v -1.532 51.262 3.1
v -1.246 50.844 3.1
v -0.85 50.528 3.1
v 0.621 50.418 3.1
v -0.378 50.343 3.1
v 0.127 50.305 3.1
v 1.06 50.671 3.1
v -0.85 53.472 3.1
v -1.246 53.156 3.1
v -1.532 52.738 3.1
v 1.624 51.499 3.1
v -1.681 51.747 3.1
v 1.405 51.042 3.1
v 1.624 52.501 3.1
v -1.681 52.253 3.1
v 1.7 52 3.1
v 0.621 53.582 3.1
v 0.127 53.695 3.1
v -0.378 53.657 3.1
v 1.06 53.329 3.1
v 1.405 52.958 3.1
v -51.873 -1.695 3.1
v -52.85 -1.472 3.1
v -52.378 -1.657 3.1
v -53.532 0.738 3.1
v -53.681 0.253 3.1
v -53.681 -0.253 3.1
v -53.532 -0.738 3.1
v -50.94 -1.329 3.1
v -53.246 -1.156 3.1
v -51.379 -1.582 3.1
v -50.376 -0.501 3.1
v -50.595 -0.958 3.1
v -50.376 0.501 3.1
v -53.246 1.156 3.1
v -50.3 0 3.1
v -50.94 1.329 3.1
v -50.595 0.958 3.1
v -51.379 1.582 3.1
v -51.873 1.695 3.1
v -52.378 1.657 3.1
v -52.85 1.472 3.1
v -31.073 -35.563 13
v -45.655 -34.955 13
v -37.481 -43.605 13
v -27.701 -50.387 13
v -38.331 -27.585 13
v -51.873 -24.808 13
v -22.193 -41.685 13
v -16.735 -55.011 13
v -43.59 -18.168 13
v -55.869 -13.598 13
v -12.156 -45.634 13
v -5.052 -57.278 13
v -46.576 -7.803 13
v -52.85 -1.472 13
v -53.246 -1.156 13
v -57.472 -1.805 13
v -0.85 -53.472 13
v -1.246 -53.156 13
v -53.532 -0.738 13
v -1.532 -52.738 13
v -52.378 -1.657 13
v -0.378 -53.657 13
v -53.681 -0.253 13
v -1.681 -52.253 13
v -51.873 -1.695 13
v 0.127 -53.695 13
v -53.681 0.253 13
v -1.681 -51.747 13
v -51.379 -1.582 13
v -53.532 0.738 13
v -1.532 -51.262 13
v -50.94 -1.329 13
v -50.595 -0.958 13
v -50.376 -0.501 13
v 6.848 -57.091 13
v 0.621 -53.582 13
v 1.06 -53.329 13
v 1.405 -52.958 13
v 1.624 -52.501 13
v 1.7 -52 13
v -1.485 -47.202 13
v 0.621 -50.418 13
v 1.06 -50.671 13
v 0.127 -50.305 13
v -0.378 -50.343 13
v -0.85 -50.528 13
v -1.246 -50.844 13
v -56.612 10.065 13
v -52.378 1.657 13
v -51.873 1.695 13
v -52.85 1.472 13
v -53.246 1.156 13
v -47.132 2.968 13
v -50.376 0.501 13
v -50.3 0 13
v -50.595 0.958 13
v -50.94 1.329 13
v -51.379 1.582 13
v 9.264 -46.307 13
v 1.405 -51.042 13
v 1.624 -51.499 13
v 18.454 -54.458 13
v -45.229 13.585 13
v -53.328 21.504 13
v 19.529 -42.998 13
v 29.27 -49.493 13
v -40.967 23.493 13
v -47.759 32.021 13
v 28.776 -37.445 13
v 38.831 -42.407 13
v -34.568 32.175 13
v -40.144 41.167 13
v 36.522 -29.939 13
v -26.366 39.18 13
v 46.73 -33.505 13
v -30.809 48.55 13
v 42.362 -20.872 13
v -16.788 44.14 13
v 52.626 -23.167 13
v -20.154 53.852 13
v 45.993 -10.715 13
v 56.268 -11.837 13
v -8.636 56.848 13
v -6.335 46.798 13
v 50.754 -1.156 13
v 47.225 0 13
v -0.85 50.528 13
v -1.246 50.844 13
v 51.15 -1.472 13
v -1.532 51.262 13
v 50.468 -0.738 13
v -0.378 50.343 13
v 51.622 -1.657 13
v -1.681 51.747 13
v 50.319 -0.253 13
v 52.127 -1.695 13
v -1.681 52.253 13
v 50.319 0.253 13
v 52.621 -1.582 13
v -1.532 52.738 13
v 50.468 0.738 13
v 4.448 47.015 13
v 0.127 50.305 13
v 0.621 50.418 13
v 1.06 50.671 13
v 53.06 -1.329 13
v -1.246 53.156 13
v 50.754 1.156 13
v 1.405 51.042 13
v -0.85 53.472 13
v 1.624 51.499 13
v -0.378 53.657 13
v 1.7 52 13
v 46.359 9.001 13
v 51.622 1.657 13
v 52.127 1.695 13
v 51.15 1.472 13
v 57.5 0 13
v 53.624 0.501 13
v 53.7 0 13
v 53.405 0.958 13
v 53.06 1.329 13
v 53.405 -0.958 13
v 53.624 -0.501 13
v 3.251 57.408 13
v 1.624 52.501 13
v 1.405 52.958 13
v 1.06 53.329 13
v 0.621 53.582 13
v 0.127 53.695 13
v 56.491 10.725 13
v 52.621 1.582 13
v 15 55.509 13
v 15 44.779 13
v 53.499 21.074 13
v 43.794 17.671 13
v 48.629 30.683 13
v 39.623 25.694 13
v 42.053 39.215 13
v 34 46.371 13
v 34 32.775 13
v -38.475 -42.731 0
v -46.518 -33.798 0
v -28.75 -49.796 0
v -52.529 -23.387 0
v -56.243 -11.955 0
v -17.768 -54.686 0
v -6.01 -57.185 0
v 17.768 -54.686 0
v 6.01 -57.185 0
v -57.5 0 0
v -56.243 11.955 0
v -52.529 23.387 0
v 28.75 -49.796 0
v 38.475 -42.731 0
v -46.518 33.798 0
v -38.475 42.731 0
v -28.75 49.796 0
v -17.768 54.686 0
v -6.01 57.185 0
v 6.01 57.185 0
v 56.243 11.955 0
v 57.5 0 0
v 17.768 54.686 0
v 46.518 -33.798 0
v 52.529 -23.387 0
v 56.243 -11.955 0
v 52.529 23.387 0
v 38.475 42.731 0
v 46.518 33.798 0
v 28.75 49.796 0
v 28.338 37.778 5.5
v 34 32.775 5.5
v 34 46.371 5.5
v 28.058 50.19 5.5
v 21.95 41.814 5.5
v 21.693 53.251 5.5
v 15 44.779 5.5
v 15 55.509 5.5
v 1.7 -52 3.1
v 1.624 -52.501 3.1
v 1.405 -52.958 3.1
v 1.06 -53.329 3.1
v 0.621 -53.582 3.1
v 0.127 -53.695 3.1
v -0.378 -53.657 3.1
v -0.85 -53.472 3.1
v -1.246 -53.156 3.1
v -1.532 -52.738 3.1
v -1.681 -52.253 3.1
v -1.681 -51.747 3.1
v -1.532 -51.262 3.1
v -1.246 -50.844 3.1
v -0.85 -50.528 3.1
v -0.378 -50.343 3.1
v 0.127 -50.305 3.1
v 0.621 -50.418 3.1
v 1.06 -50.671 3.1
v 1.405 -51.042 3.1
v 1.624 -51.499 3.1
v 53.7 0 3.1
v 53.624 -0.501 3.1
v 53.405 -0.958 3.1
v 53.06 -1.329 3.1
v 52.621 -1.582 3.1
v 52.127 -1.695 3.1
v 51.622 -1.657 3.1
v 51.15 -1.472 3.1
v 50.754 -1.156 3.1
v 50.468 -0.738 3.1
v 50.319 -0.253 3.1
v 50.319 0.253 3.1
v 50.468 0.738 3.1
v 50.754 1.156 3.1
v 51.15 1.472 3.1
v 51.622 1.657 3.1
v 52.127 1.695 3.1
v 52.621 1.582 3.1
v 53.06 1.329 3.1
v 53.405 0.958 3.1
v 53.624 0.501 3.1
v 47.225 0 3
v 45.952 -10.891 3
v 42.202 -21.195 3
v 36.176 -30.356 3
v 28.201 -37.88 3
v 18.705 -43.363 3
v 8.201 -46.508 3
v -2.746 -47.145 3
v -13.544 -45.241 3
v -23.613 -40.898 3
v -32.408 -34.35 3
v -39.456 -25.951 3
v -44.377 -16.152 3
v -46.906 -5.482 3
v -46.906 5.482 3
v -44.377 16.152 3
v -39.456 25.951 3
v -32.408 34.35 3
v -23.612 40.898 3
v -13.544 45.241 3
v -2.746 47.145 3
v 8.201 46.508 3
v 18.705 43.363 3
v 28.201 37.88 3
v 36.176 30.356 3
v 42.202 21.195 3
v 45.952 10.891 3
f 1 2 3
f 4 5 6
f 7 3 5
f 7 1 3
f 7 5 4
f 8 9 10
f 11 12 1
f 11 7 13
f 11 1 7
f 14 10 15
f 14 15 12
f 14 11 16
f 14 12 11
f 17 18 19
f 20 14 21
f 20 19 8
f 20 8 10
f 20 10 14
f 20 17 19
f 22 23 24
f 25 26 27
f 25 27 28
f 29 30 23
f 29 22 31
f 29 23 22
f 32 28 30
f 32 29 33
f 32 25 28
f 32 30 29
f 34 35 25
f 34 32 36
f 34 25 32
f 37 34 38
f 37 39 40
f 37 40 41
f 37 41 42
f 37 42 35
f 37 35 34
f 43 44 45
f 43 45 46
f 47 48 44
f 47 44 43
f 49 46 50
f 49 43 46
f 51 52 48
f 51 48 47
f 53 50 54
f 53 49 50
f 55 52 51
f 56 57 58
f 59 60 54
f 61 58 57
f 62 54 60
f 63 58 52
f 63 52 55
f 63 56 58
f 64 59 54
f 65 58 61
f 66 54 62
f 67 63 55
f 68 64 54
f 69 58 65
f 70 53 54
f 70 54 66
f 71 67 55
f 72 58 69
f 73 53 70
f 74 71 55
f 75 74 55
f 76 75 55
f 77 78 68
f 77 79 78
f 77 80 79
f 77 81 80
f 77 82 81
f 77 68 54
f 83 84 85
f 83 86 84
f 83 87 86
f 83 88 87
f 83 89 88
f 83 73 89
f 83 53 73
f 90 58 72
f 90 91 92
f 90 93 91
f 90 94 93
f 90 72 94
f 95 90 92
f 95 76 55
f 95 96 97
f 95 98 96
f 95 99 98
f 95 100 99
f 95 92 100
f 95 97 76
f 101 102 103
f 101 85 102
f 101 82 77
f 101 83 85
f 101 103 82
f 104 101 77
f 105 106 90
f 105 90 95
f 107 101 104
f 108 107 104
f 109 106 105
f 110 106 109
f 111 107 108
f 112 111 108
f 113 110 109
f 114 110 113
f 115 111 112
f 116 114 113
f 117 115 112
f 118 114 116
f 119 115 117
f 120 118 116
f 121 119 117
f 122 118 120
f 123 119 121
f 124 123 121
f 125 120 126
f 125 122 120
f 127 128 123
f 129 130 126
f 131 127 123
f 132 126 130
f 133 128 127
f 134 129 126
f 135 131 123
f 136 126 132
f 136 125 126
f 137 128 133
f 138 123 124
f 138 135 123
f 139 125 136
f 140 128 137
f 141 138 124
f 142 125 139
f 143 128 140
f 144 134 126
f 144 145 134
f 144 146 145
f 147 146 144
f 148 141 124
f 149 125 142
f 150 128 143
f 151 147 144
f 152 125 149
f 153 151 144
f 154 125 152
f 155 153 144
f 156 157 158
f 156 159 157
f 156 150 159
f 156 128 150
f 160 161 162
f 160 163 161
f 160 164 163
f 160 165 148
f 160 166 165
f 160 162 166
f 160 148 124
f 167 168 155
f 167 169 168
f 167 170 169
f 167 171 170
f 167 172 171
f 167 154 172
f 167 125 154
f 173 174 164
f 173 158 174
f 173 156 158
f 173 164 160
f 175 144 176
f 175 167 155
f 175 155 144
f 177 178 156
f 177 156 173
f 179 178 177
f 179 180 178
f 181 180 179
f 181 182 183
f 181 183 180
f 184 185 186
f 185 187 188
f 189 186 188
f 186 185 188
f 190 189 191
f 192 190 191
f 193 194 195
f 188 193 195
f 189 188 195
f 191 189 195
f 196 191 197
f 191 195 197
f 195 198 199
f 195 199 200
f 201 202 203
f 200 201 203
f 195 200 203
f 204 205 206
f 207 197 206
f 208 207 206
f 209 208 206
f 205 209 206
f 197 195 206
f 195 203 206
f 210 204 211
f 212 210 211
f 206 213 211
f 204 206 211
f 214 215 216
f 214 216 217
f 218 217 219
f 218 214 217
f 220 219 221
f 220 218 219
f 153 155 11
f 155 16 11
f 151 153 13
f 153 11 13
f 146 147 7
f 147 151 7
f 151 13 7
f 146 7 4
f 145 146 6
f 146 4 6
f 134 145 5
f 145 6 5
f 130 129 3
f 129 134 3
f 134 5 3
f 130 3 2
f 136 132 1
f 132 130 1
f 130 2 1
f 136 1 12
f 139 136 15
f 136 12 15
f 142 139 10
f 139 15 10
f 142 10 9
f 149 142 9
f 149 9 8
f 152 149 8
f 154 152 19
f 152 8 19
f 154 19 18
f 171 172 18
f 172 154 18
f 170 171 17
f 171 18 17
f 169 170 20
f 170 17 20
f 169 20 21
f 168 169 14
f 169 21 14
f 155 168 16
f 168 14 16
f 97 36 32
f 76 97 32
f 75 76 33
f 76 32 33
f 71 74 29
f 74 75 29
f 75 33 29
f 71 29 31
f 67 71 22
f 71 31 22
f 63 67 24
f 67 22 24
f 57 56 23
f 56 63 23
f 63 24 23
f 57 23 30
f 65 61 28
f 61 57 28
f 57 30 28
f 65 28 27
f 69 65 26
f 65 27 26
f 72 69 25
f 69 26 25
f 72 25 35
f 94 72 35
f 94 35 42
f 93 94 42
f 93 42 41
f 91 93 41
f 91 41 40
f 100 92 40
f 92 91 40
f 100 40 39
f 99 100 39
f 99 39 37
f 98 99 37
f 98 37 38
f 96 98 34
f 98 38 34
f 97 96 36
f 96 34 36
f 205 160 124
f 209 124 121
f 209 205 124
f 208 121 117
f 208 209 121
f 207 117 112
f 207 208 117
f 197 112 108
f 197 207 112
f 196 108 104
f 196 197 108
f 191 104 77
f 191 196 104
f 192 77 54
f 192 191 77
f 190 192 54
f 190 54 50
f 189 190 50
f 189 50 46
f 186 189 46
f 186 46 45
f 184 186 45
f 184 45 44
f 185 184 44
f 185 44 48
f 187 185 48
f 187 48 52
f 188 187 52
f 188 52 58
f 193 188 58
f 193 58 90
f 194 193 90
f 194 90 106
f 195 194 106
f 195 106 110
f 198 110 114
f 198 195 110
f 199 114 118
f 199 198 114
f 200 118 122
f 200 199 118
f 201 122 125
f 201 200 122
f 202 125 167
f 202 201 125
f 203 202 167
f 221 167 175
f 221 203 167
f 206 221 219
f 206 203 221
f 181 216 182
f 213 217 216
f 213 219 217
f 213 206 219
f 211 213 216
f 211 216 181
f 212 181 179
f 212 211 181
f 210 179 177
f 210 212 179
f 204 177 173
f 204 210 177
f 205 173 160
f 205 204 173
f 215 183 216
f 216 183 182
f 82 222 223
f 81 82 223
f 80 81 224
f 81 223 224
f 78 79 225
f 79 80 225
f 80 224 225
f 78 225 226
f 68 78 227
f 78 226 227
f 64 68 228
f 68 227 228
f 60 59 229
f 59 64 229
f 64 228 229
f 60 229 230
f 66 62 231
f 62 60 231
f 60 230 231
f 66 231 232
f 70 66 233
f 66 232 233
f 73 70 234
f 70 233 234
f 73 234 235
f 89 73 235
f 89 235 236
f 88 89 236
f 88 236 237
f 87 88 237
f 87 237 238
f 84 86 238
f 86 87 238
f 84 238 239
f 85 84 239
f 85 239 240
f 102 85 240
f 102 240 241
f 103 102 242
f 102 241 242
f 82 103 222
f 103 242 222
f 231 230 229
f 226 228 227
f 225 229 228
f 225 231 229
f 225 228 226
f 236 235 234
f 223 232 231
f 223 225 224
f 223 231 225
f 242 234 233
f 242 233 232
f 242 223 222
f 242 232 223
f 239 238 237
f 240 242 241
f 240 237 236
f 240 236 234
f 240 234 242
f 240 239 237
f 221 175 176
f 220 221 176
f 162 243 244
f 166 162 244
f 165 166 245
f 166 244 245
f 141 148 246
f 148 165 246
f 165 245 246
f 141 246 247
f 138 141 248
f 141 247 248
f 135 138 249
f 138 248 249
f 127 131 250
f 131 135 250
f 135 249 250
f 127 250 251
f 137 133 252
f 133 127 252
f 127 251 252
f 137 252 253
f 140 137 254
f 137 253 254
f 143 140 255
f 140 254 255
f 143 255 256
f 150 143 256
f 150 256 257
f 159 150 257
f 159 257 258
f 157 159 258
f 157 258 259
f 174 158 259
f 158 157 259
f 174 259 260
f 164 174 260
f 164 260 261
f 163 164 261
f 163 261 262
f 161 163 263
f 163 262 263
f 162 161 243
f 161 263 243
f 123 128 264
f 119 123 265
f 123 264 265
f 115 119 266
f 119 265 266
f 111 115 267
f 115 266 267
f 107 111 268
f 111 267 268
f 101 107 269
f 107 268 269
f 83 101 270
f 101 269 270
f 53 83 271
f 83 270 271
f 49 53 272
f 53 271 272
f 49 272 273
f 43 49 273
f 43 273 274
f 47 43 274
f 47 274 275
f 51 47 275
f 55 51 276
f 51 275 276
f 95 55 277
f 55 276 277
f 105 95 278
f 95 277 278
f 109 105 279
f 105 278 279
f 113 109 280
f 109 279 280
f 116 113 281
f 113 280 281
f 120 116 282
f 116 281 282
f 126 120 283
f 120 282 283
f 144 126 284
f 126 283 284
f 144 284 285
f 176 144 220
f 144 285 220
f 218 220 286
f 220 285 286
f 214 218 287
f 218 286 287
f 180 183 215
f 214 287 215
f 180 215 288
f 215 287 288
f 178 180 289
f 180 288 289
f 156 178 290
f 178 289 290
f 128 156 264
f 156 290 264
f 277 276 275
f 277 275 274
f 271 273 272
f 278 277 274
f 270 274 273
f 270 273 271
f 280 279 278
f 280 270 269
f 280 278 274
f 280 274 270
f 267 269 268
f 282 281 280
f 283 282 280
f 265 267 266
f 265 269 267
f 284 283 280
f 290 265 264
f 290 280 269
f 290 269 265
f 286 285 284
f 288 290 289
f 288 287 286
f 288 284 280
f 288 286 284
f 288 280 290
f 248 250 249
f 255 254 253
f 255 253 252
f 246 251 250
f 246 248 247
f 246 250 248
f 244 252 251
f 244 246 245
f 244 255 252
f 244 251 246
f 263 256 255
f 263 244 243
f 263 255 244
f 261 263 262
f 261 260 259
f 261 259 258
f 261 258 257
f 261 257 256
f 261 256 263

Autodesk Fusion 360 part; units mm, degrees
sketch "Sketch1" plane through (0, 0, 0) normal (0, 0, 1) x (1, 0, 0)
  circle A0 centre (0, 0) radius 47.225
  circle A1 centre (0, 0) radius 57.5
  circle A2 centre (0, 52) radius 1.7
  circle A3 centre (0, -52) radius 1.7
  circle A4 centre (-52, 0) radius 1.7
  circle A5 centre (52, 0) radius 1.7
  dimension "d1" = 94.45
  dimension "d2" = 115
  dimension "d3" = 3.4
  dimension "d4" = 3.4
  dimension "d5" = 3.4
  dimension "d6" = 3.4
extrude "Extrude4" add sketch "Sketch1" along normal blind 3.1 contours A2 | A3 | A4 | A5 makes body 1 at (53.6979, -0.0847, 2.0667) makes body 2 at (-50.3021, -0.0847, 2.0667) makes body 3 at (-1.5975, 52.5814, 2.0667) makes body 4 at (-1.5975, -51.4186, 2.0667)
extrude "Extrude5" add sketch "Sketch1" along normal blind 13 bodies 1 2 3 4
extrude "Extrude6" add sketch "Sketch1" along normal blind 3 contours A0 bodies 1
sketch "Sketch2" plane through (0, 0, 13) normal (0, 0, 1) x (-1, 0, 0)
  circle A0 centre (0, -52) radius 1.7
  circle A1 centre (52, 0) radius 1.7
  circle A2 centre (0, 52) radius 1.7
  circle A3 centre (-52, 0) radius 1.7
  circle A4 centre (0, 0) radius 47.225
  circle A5 centre (0, 0) radius 57.5
  line L0 (-15, -35) -> (-34, -35)
  line L1 (-34, -35) -> (-34, -57)
  line L2 (-34, -57) -> (-15, -57)
  line L3 (-15, -57) -> (-15, -35)
  line L4 (-34, -35) -> (-15, -35)
  line L5 (-15, -35) -> (-15, -31)
  line L6 (-15, -31) -> (-34, -31)
  line L7 (-34, -31) -> (-34, -35)
extrude "Extrude7" cut sketch "Sketch2" against normal blind 7.5 contours A4 L0 L4 L7 | A4 A5 L0 L1 L3 L4 bodies 1
extrude "Extrude3" [suppressed]
extrude "Extrude2" [suppressed]
